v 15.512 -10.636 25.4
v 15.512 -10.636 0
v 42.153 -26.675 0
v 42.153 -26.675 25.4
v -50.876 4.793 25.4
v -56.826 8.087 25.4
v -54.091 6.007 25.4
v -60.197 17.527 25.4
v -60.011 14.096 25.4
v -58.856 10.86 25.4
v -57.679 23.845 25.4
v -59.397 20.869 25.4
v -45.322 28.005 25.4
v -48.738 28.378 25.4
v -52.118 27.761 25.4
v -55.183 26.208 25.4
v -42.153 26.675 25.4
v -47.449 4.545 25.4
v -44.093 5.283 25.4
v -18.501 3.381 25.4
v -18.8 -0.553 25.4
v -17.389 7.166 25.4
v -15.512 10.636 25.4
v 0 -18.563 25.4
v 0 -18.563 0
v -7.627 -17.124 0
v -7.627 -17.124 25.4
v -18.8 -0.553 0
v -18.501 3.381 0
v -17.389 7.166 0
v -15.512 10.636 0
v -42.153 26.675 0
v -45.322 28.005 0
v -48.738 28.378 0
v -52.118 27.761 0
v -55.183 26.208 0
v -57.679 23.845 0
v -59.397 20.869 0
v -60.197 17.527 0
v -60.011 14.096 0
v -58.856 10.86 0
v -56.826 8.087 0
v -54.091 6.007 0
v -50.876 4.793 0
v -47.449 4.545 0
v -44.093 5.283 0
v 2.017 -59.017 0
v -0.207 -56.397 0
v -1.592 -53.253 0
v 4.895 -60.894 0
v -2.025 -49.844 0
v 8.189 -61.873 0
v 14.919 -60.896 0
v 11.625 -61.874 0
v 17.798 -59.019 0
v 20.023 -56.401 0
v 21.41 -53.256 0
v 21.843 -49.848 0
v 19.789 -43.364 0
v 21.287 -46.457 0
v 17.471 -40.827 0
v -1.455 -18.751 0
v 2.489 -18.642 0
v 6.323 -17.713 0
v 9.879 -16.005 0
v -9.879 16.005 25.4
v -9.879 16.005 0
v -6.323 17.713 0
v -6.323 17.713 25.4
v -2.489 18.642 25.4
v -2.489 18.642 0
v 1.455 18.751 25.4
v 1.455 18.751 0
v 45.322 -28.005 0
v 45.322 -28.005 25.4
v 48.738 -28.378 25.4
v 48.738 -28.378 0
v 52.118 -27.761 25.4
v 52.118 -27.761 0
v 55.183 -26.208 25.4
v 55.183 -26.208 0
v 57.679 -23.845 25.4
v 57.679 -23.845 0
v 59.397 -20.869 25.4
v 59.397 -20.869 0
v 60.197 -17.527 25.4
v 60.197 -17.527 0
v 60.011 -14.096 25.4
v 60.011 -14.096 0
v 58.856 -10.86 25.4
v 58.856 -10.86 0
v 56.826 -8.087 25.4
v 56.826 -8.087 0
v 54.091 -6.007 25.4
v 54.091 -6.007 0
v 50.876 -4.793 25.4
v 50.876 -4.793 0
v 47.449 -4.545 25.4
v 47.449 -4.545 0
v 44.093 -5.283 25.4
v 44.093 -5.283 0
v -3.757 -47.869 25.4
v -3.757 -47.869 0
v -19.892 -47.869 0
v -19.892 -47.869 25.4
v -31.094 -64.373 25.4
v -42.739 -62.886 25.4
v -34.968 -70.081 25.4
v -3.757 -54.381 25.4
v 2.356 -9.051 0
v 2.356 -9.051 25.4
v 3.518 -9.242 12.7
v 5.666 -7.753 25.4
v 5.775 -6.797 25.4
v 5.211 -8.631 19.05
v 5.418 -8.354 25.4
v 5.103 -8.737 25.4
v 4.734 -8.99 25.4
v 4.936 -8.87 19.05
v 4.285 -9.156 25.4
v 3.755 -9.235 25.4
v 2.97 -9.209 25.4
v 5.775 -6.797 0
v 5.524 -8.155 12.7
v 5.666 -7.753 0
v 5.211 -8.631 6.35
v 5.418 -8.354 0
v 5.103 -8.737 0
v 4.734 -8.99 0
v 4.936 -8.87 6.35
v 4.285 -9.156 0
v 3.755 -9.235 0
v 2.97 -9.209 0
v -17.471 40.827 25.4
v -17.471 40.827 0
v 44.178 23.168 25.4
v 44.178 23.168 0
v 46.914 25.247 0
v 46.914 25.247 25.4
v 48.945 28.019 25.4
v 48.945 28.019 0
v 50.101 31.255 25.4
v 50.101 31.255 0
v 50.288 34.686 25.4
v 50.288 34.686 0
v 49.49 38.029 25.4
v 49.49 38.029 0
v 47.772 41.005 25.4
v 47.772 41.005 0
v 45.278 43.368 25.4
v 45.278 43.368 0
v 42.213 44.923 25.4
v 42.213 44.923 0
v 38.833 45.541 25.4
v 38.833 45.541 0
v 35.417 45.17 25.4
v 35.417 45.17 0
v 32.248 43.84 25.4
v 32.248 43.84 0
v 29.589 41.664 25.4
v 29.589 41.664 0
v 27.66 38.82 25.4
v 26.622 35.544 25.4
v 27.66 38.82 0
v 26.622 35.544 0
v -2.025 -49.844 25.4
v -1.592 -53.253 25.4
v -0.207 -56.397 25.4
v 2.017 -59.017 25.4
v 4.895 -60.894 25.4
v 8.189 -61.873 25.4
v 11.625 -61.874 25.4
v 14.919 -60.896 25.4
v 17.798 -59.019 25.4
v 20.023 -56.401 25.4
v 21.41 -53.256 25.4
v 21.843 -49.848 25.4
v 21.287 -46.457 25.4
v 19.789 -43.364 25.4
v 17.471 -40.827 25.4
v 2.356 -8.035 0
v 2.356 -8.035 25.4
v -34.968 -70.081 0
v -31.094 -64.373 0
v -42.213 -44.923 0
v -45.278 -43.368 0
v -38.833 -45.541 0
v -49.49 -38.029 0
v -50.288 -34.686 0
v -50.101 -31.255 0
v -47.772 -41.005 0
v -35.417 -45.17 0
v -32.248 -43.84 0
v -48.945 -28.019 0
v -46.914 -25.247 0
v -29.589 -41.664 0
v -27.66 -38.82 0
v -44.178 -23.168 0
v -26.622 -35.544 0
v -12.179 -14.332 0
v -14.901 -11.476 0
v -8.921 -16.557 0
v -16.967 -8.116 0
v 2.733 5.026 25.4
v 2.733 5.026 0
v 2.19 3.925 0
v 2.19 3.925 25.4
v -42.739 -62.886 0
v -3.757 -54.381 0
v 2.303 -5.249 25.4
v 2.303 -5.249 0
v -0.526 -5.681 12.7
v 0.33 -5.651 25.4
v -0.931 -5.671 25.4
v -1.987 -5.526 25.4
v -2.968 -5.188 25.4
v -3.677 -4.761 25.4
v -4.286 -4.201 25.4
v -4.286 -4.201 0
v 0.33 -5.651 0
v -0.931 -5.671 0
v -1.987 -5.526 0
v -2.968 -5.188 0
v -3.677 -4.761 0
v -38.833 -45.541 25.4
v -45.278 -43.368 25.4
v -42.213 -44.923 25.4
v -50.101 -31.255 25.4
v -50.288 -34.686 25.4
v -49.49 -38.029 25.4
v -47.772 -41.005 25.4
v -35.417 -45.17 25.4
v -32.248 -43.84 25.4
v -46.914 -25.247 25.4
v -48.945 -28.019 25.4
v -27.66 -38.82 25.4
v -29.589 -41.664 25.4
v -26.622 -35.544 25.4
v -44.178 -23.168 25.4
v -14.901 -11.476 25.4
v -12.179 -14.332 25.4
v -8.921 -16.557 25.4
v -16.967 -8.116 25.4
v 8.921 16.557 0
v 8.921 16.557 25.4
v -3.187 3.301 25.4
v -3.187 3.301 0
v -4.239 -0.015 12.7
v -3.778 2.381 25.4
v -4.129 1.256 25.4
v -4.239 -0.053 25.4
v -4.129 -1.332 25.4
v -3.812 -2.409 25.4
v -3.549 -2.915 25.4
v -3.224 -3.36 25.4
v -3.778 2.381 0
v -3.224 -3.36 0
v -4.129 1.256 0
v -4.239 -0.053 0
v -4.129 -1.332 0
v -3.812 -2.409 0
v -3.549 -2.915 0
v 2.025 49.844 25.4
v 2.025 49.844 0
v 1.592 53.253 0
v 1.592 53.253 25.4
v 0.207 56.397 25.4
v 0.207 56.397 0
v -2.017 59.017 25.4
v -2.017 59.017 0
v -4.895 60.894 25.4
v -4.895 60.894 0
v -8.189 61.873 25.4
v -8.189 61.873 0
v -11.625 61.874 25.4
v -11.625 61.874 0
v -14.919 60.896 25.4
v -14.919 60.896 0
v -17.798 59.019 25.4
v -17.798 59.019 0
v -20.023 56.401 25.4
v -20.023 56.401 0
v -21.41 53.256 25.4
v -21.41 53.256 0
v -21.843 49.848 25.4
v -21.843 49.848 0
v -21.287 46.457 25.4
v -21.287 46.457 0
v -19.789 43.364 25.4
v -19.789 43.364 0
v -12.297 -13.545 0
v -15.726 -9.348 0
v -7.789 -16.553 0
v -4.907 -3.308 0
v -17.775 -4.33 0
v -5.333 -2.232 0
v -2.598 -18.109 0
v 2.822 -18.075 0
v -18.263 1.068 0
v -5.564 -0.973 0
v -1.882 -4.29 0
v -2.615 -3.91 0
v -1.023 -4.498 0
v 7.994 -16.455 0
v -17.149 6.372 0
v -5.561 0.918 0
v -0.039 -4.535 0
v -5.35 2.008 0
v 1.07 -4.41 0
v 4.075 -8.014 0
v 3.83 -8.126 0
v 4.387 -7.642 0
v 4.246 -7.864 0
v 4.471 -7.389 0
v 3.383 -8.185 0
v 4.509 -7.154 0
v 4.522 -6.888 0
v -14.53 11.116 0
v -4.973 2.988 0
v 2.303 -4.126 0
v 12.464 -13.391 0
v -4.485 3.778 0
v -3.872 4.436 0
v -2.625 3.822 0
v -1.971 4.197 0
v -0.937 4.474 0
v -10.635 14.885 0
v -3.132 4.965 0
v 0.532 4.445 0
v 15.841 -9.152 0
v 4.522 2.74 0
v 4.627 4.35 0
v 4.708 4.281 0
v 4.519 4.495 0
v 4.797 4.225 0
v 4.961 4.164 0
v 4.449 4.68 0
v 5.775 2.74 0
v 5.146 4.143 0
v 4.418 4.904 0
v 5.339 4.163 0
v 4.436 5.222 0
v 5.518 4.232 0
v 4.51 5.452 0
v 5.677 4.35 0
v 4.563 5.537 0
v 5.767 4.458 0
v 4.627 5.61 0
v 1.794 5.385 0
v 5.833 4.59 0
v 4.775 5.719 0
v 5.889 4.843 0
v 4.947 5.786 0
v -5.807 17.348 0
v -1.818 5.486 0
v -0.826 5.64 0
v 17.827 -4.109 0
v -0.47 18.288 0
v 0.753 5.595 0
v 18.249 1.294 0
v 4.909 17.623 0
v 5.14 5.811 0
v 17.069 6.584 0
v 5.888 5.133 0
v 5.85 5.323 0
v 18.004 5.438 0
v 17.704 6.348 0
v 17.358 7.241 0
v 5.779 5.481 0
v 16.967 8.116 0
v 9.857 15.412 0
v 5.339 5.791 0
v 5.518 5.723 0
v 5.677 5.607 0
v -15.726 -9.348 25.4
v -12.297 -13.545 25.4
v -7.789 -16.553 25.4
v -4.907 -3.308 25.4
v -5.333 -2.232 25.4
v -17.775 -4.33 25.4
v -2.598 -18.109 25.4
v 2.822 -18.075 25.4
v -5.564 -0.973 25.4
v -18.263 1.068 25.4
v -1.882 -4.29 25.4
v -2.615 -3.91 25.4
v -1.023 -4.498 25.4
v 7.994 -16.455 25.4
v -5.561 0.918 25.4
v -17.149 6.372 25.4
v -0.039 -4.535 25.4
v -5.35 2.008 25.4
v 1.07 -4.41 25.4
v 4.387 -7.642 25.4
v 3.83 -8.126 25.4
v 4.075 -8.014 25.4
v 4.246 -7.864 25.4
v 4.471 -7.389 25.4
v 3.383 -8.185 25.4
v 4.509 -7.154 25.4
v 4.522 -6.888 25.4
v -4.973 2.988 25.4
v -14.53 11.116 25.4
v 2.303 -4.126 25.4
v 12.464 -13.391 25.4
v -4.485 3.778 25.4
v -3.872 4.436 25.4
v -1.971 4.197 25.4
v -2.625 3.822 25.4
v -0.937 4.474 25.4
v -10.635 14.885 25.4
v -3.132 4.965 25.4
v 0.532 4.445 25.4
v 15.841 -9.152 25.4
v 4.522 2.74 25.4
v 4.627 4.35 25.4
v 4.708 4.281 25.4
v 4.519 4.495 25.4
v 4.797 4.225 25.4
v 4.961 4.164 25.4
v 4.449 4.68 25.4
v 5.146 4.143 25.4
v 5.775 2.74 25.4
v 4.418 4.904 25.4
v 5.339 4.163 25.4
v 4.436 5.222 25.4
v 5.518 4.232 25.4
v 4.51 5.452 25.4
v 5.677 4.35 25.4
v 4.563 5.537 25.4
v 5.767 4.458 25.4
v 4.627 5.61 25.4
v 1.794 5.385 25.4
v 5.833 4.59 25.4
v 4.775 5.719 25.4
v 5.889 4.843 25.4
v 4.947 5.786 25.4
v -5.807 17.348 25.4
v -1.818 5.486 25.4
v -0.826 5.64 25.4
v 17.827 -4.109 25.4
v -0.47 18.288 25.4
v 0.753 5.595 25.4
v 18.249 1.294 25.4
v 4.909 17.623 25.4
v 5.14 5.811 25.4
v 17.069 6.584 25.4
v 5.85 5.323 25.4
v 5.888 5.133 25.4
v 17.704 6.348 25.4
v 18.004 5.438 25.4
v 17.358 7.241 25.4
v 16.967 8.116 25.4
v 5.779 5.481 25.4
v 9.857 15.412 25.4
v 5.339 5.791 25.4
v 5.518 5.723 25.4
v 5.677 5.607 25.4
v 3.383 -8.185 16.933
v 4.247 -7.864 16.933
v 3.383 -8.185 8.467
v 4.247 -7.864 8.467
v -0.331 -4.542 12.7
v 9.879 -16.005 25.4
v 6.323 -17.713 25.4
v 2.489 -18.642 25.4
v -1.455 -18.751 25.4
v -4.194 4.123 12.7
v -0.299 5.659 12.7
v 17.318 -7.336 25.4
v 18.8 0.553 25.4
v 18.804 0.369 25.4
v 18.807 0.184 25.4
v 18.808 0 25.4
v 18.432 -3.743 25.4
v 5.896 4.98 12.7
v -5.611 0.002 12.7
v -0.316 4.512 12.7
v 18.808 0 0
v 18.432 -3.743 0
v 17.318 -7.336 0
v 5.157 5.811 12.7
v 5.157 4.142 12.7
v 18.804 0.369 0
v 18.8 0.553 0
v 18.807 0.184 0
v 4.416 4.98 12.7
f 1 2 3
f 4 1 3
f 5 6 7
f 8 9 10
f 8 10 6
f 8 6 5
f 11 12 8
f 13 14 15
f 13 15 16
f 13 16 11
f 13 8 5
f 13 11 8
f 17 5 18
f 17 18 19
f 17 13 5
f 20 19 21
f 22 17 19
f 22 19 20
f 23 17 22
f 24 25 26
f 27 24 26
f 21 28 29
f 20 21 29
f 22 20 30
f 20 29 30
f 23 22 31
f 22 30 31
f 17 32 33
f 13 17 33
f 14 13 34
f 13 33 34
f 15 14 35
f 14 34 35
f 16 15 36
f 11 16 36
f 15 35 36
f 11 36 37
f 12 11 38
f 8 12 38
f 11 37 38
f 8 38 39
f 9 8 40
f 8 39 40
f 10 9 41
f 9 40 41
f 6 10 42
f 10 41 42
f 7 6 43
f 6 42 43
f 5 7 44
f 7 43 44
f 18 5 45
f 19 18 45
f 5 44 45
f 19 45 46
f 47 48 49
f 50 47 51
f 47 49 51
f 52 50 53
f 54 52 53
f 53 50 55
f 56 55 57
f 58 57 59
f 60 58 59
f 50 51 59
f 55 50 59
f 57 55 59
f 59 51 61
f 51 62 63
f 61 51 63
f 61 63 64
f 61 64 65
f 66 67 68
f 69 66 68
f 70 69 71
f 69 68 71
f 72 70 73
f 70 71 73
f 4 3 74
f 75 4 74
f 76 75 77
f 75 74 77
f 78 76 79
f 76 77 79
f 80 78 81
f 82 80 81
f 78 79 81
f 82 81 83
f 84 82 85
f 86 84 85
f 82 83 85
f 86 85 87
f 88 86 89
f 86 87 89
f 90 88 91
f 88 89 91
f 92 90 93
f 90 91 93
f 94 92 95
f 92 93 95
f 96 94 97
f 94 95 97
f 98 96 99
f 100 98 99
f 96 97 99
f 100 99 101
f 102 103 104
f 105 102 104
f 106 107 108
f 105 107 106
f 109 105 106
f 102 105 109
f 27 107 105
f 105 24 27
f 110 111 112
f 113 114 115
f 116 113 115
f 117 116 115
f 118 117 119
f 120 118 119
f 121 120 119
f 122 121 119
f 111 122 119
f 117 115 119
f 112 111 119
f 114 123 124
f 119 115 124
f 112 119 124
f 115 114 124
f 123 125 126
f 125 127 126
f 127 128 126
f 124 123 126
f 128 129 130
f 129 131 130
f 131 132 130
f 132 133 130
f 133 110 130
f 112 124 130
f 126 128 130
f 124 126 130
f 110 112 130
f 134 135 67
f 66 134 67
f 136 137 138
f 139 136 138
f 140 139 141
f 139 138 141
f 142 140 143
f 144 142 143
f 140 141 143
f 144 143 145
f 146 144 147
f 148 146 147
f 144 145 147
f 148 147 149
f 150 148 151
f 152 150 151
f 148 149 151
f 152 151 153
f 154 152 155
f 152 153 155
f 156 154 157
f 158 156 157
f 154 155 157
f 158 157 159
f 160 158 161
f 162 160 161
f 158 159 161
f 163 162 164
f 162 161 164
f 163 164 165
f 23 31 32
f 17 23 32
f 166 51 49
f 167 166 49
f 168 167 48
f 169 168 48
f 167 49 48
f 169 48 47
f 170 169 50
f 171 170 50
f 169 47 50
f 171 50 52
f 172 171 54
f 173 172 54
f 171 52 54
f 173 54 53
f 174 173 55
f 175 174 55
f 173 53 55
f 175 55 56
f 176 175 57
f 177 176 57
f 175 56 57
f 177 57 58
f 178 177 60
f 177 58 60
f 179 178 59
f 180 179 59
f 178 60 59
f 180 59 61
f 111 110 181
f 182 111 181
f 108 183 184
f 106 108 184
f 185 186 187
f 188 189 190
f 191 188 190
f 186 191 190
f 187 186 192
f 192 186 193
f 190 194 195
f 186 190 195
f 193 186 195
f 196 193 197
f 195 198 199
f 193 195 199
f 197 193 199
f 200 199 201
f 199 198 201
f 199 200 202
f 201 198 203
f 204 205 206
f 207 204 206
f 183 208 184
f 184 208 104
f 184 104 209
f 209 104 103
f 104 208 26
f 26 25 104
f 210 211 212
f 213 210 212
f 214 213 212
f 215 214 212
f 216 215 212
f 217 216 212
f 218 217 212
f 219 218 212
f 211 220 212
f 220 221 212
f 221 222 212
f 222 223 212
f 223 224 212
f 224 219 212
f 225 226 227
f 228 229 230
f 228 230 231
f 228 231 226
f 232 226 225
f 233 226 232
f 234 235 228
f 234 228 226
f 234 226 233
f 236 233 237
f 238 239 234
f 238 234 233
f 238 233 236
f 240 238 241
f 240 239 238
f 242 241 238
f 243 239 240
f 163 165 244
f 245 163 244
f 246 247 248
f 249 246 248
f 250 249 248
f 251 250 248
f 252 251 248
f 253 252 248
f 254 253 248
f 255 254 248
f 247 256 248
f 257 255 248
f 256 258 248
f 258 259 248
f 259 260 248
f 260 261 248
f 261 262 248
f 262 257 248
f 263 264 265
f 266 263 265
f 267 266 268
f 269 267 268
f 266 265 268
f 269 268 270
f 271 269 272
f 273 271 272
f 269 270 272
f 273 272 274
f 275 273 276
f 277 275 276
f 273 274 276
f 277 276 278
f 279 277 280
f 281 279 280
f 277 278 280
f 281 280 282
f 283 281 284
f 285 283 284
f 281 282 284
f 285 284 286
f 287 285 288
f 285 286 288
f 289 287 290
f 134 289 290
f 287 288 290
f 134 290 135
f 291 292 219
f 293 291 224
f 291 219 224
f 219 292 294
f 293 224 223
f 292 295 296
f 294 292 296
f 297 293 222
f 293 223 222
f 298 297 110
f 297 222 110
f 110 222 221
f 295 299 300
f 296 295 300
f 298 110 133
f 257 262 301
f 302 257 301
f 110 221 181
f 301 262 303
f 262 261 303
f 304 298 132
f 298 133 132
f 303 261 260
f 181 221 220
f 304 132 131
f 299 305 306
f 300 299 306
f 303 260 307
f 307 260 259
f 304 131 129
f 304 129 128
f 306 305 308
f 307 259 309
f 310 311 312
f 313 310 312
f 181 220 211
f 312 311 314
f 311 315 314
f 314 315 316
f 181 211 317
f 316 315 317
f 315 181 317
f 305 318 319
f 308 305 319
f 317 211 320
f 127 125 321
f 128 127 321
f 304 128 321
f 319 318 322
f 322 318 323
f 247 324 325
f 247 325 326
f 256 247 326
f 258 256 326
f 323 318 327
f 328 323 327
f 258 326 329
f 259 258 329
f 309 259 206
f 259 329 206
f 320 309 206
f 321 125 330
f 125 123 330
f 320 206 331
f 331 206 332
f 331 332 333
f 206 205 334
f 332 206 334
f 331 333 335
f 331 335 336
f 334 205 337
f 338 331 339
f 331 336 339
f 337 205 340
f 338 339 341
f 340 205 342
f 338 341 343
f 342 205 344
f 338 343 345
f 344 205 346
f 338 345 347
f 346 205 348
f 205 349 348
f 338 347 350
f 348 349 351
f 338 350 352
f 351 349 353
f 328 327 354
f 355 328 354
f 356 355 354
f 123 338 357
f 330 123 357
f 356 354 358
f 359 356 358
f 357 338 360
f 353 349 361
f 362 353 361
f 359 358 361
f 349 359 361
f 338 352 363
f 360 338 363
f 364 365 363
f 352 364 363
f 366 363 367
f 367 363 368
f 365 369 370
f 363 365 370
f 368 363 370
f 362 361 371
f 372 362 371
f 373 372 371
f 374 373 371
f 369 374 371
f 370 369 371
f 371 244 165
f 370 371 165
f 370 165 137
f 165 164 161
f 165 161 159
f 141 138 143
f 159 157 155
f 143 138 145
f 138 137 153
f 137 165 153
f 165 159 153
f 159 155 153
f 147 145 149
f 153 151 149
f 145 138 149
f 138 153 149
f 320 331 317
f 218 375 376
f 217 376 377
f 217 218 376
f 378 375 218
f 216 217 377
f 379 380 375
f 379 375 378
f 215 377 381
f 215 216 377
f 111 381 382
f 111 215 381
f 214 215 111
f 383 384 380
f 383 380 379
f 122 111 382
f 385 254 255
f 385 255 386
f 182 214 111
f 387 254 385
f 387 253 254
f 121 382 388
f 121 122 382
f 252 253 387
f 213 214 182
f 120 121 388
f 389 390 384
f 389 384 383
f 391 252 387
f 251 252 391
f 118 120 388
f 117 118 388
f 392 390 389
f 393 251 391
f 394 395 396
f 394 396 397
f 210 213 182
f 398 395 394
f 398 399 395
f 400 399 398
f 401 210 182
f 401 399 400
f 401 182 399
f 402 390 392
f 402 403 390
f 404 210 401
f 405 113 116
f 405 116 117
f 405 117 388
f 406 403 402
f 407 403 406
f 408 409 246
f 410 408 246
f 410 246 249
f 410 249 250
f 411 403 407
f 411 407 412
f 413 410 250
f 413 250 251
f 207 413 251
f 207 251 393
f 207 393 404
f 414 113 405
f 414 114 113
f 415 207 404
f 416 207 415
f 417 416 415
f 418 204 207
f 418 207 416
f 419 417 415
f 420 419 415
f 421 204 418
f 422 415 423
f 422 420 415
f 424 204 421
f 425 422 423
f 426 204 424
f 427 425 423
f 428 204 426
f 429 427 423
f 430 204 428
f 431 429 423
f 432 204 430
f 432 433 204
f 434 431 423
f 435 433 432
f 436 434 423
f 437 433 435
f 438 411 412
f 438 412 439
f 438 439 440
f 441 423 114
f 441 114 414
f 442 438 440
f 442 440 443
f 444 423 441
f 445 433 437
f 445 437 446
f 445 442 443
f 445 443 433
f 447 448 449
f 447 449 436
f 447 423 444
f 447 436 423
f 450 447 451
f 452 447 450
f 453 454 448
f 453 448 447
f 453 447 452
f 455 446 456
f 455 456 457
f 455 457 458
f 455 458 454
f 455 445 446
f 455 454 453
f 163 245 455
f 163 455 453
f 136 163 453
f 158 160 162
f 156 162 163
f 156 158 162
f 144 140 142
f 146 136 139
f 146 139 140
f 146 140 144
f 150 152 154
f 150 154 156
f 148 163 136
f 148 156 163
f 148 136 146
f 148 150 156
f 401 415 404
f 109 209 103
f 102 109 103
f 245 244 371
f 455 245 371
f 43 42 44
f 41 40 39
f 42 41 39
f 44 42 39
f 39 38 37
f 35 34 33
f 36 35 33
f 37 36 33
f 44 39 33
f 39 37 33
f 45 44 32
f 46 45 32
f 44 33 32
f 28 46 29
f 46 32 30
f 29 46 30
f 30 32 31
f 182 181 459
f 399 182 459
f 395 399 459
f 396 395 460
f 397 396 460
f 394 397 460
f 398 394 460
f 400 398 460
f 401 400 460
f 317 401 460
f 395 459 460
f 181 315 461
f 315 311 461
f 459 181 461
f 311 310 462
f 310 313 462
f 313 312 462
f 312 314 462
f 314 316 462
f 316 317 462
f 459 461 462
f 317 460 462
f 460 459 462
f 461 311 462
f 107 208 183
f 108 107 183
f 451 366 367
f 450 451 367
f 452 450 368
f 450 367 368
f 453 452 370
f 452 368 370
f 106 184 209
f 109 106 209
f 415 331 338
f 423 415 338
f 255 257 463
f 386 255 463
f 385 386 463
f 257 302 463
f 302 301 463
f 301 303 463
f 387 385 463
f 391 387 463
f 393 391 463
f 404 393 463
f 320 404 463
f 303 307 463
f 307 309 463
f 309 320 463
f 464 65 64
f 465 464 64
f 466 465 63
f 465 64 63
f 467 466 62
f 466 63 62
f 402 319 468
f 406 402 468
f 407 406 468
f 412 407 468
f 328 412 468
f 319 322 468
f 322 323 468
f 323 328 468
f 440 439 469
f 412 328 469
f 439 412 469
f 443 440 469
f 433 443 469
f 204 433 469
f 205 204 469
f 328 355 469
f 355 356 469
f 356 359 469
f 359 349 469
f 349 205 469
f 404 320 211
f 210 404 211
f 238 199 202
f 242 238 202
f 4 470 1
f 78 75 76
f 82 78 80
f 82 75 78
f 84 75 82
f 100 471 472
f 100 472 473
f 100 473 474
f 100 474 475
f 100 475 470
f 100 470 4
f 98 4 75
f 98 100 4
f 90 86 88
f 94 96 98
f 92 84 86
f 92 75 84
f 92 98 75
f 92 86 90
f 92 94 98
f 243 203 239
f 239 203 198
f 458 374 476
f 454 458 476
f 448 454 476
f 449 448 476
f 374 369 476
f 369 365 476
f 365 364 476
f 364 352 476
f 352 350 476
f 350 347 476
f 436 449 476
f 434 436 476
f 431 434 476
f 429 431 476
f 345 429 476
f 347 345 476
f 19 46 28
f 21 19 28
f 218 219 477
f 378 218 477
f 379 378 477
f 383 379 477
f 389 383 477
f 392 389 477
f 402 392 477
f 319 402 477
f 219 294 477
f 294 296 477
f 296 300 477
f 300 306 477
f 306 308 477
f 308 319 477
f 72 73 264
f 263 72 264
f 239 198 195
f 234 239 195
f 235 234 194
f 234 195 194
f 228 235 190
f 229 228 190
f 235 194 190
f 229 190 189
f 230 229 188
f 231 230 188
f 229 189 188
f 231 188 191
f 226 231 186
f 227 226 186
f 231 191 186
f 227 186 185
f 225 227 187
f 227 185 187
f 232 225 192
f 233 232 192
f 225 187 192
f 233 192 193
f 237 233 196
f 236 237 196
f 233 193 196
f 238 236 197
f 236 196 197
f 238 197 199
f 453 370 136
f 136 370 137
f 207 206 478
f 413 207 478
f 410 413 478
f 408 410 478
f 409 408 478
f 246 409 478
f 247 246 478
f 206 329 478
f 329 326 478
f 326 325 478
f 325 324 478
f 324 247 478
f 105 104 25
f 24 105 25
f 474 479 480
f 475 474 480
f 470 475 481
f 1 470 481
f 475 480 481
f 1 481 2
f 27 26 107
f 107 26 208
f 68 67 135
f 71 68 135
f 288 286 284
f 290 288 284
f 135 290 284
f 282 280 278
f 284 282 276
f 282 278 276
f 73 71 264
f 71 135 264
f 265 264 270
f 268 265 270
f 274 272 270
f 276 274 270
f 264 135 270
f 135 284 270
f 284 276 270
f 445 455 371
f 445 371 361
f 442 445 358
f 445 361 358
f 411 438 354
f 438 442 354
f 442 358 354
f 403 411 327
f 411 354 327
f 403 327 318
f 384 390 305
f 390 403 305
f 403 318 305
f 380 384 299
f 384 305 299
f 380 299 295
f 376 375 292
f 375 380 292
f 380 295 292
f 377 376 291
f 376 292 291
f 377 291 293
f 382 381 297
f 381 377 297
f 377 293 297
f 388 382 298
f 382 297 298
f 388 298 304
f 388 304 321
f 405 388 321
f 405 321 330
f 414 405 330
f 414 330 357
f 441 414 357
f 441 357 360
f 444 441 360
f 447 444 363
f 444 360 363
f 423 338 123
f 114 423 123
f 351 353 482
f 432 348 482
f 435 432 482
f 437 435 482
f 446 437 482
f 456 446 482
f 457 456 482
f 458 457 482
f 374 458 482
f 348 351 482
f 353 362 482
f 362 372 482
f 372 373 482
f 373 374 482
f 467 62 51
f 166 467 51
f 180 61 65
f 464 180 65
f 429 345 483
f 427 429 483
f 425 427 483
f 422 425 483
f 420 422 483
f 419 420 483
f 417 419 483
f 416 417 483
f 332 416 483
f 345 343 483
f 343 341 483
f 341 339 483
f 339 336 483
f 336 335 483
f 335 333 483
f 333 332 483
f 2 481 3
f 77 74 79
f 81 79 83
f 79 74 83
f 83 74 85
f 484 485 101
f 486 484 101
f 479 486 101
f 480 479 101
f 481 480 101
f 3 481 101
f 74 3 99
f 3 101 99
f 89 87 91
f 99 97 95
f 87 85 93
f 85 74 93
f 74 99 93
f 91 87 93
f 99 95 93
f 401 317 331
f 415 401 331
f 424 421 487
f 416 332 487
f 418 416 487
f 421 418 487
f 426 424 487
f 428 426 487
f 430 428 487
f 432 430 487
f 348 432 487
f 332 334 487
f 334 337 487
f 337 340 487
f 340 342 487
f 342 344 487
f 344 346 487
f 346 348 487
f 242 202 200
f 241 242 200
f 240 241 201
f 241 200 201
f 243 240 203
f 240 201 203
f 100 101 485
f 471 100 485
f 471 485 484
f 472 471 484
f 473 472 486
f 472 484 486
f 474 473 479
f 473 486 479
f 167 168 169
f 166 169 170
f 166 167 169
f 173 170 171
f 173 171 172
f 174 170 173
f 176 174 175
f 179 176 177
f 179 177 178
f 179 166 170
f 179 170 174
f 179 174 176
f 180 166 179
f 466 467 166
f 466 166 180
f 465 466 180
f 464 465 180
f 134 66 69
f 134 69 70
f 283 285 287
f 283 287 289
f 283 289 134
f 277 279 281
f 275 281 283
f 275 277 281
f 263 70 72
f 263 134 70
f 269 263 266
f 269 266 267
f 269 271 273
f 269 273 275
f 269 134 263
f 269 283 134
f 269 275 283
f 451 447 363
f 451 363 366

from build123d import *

# Parameters (mm, degrees)
F1_DEPTH = 25.4
F2_R     = 18.2943509446
F3_DEPTH = 25.4
F5_DEPTH = 25.4


with BuildPart() as f1:
    # F0 (on Top) → F1 (new body)
    with BuildSketch(Plane.XY):
        with BuildLine():
            ThreePointArc((8.9210946377, 16.5574376809), (13.6147673533, 12.9758538065), (16.9667911656, 8.1155819035))
            Line((16.9667911656, 8.1155819035), (44.1781841218, 23.1683626771))
            ThreePointArc((44.1781841218, 23.1683626771), (45.2775218946, 43.3683275222), (26.6220346093, 35.5440117419))
            Line((26.6220346093, 35.5440117419), (8.9210946377, 16.5574376809))
        make_face()
        with BuildLine():
            Line((8.9210946377, 16.5574376809), (18.0044832363, 5.4381297783))
            ThreePointArc((18.0044832363, 5.4381297783), (17.5368097382, 6.7966886273), (16.9667911656, 8.1155819035))
            ThreePointArc((16.9667911656, 8.1155819035), (13.6147673533, 12.9758538065), (8.9210946377, 16.5574376809))
        make_face()
    extrude(amount=F1_DEPTH)

    # F2 (on Top) → F3 (join)
    with BuildSketch(Plane.XY):
        Circle(F2_R)
        with BuildLine():
            add(Edge.make_bspline(
                [(2.1898622284, 3.9251737702), (0.93686252, 4.5118383735), (-0.3161371884, 4.5118383735)],
                knots=[0, 0, 0, 1, 1, 1], degree=2))
            add(Edge.make_bspline(
                [(-0.3161371884, 4.5118383735), (-2.1340731816, 4.5118383735), (-3.1866895069, 3.3010881736)],
                knots=[0, 0, 0, 1, 1, 1], degree=2))
            add(Edge.make_bspline(
                [(-3.1866895069, 3.3010881736), (-4.2393058323, 2.0903379736), (-4.2393058323, -0.0148946771)],
                knots=[0, 0, 0, 1, 1, 1], degree=2))
            add(Edge.make_bspline(
                [(-4.2393058323, -0.0148946771), (-4.2393058323, -2.1780695109), (-3.2241105002, -3.3598486193)],
                knots=[0, 0, 0, 1, 1, 1], degree=2))
            add(Edge.make_bspline(
                [(-3.2241105002, -3.3598486193), (-2.208915168, -4.5416277277), (-0.3306227342, -4.5416277277)],
                knots=[0, 0, 0, 1, 1, 1], degree=2))
            add(Edge.make_bspline(
                [(-0.3306227342, -4.5416277277), (0.8233924115, -4.5416277277), (2.3033323369, -4.1263754159)],
                knots=[0, 0, 0, 1, 1, 1], degree=2))
            Line((2.3033323369, -4.1263754159), (2.3033323369, -5.2490052124))
            add(Edge.make_bspline(
                [(2.3033323369, -5.2490052124), (1.156559964, -5.6811573277), (-0.526177602, -5.6811573277)],
                knots=[0, 0, 0, 1, 1, 1], degree=2))
            add(Edge.make_bspline(
                [(-0.526177602, -5.6811573277), (-2.9621635476, -5.6811573277), (-4.286383856, -4.2012174023)],
                knots=[0, 0, 0, 1, 1, 1], degree=2))
            add(Edge.make_bspline(
                [(-4.286383856, -4.2012174023), (-5.6106041645, -2.721277477), (-5.6106041645, 0.0020051263)],
                knots=[0, 0, 0, 1, 1, 1], degree=2))
            add(Edge.make_bspline(
                [(-5.6106041645, 0.0020051263), (-5.6106041645, 1.7064710109), (-4.9732401509, 2.9884418109)],
                knots=[0, 0, 0, 1, 1, 1], degree=2))
            add(Edge.make_bspline(
                [(-4.9732401509, 2.9884418109), (-4.3358761374, 4.2704126108), (-3.1323687103, 4.9645116786)],
                knots=[0, 0, 0, 1, 1, 1], degree=2))
            add(Edge.make_bspline(
                [(-3.1323687103, 4.9645116786), (-1.9288612833, 5.6586107463), (-0.2992373851, 5.6586107463)],
                knots=[0, 0, 0, 1, 1, 1], degree=2))
            add(Edge.make_bspline(
                [(-0.2992373851, 5.6586107463), (1.4341995911, 5.6586107463), (2.7330701945, 5.0260752481)],
                knots=[0, 0, 0, 1, 1, 1], degree=2))
            Line((2.7330701945, 5.0260752481), (2.1898622284, 3.9251737702))
        make_face(mode=Mode.SUBTRACT)
        with BuildLine():
            add(Edge.make_bspline(
                [(5.7750348045, -6.7965443513), (5.7750348045, -9.2421873275), (3.5177039232, -9.2421873275)],
                knots=[0, 0, 0, 1, 1, 1], degree=2))
            add(Edge.make_bspline(
                [(3.5177039232, -9.2421873275), (2.800669408, -9.2421873275), (2.3564460046, -9.051460975)],
                knots=[0, 0, 0, 1, 1, 1], degree=2))
            Line((2.3564460046, -9.051460975), (2.3564460046, -8.035058514))
            add(Edge.make_bspline(
                [(2.3564460046, -8.035058514), (2.8779256521, -8.1847424869), (3.3825054961, -8.1847424869)],
                knots=[0, 0, 0, 1, 1, 1], degree=2))
            add(Edge.make_bspline(
                [(3.3825054961, -8.1847424869), (3.9715843571, -8.1847424869), (4.2468097266, -7.8636462225)],
                knots=[0, 0, 0, 1, 1, 1], degree=2))
            add(Edge.make_bspline(
                [(4.2468097266, -7.8636462225), (4.5220350961, -7.5425499581), (4.5220350961, -6.8882861412)],
                knots=[0, 0, 0, 1, 1, 1], degree=2))
            Line((4.5220350961, -6.8882861412), (4.5220350961, 2.7397732753))
            Line((4.5220350961, 2.7397732753), (5.7750348045, 2.7397732753))
            Line((5.7750348045, 2.7397732753), (5.7750348045, -6.7965443513))
        make_face(mode=Mode.SUBTRACT)
        with BuildLine():
            add(Edge.make_bspline(
                [(4.6270553028, 4.3500831125), (4.4158077605, 4.5577092684), (4.4158077605, 4.9802043532)],
                knots=[0, 0, 0, 1, 1, 1], degree=2))
            add(Edge.make_bspline(
                [(4.4158077605, 4.9802043532), (4.4158077605, 5.4099422108), (4.6270553028, 5.6103255938)],
                knots=[0, 0, 0, 1, 1, 1], degree=2))
            add(Edge.make_bspline(
                [(4.6270553028, 5.6103255938), (4.8383028452, 5.8107089768), (5.156984852, 5.8107089768)],
                knots=[0, 0, 0, 1, 1, 1], degree=2))
            add(Edge.make_bspline(
                [(5.156984852, 5.8107089768), (5.4587670553, 5.8107089768), (5.6772573706, 5.6067042074)],
                knots=[0, 0, 0, 1, 1, 1], degree=2))
            add(Edge.make_bspline(
                [(5.6772573706, 5.6067042074), (5.8957476858, 5.4026994379), (5.8957476858, 4.9802043532)],
                knots=[0, 0, 0, 1, 1, 1], degree=2))
            add(Edge.make_bspline(
                [(5.8957476858, 4.9802043532), (5.8957476858, 4.5577092684), (5.6772573706, 4.3500831125)],
                knots=[0, 0, 0, 1, 1, 1], degree=2))
            add(Edge.make_bspline(
                [(5.6772573706, 4.3500831125), (5.4587670553, 4.1424569566), (5.156984852, 4.1424569566)],
                knots=[0, 0, 0, 1, 1, 1], degree=2))
            add(Edge.make_bspline(
                [(5.156984852, 4.1424569566), (4.8383028452, 4.1424569566), (4.6270553028, 4.3500831125)],
                knots=[0, 0, 0, 1, 1, 1], degree=2))
        make_face(mode=Mode.SUBTRACT)
    extrude(amount=F3_DEPTH)


with BuildPart() as f1b:
    # F0 (on Top) → F1, piece 2 (new body)
    with BuildSketch(Plane.XY):
        with BuildLine():
            ThreePointArc((-18.7997089721, -0.5528242546), (-18.0448027088, 5.3028074913), (-15.5116956778, 10.6358812184))
            Line((-15.5116956778, 10.6358812184), (-42.1534827034, 26.675248404))
            ThreePointArc((-42.1534827034, 26.675248404), (-60.1968343012, 17.52732042), (-44.0930344255, 5.2833524012))
            Line((-44.0930344255, 5.2833524012), (-18.7997089721, -0.5528242546))
        make_face()
    extrude(amount=F1_DEPTH)


with BuildPart() as f1c:
    # F0 (on Top) → F1, piece 3 (new body)
    with BuildSketch(Plane.XY):
        with BuildLine():
            Line((-26.6220346093, -35.5440117419), (-8.9210946377, -16.5574376809))
            ThreePointArc((-8.9210946377, -16.5574376809), (-13.6147673533, -12.9758538065), (-16.9667911656, -8.1155819035))
            Line((-16.9667911656, -8.1155819035), (-44.1781841218, -23.1683626771))
            ThreePointArc((-44.1781841218, -23.1683626771), (-45.2775218946, -43.3683275222), (-26.6220346093, -35.5440117419))
        make_face()
    extrude(amount=F1_DEPTH)


with BuildPart() as f1d:
    # F0 (on Top) → F1, piece 4 (new body)
    with BuildSketch(Plane.XY):
        with BuildLine():
            Line((17.4709998162, -40.827364143), (9.8786143344, -16.0046134263))
            ThreePointArc((9.8786143344, -16.0046134263), (4.4300353556, -18.2786612978), (-1.4550954879, -18.7514631219))
            Line((-1.4550954879, -18.7514631219), (-2.0247014185, -49.8436110811))
            ThreePointArc((-2.0247014185, -49.8436110811), (14.9193124066, -60.8956479422), (17.4709998162, -40.827364143))
        make_face()
    extrude(amount=F1_DEPTH)


with BuildPart() as f1e:
    # F0 (on Top) → F1, piece 5 (new body)
    with BuildSketch(Plane.XY):
        with BuildLine():
            ThreePointArc((18.7997089721, 0.5528242546), (18.8058036764, 0.2764419899), (18.8078353909, 0))
            ThreePointArc((18.8078353909, 0), (17.9649115087, -5.5674614121), (15.5116956778, -10.6358812184))
            Line((15.5116956778, -10.6358812184), (42.1534827034, -26.675248404))
            ThreePointArc((42.1534827034, -26.675248404), (60.1968343012, -17.52732042), (44.0930344255, -5.2833524012))
            Line((44.0930344255, -5.2833524012), (18.7997089721, 0.5528242546))
        make_face()
    extrude(amount=F1_DEPTH)


with BuildPart() as f1f:
    # F0 (on Top) → F1, piece 6 (new body)
    with BuildSketch(Plane.XY):
        with BuildLine():
            ThreePointArc((-9.8786143344, 16.0046134263), (-4.4300353556, 18.2786612978), (1.4550954879, 18.7514631219))
            Line((1.4550954879, 18.7514631219), (2.0247014185, 49.8436110811))
            ThreePointArc((2.0247014185, 49.8436110811), (-14.9193124066, 60.8956479422), (-17.4709998162, 40.827364143))
            Line((-17.4709998162, 40.827364143), (-9.8786143344, 16.0046134263))
        make_face()
    extrude(amount=F1_DEPTH)


with BuildPart() as f5:
    # F4 (on Top) → F5 (new body)
    with BuildSketch(Plane.XY):
        Polygon((0, -18.5634717345), (-7.6268534176, -17.1244423836), (-42.7391566336, -62.8855600953), (-34.9683985114, -70.0806975365), (-31.0942010185, -64.3730324578), (-19.8917100438, -47.8689521551), align=None)
        Polygon((-3.7568265107, -47.8689521551), (-19.8917100438, -47.8689521551), (-31.0942010185, -64.3730324578), (-3.7568265107, -54.3812550604), align=None)
    extrude(amount=F5_DEPTH)


solid = Compound([f1.part, f1b.part, f1c.part, f1d.part, f1e.part, f1f.part, f5.part])
